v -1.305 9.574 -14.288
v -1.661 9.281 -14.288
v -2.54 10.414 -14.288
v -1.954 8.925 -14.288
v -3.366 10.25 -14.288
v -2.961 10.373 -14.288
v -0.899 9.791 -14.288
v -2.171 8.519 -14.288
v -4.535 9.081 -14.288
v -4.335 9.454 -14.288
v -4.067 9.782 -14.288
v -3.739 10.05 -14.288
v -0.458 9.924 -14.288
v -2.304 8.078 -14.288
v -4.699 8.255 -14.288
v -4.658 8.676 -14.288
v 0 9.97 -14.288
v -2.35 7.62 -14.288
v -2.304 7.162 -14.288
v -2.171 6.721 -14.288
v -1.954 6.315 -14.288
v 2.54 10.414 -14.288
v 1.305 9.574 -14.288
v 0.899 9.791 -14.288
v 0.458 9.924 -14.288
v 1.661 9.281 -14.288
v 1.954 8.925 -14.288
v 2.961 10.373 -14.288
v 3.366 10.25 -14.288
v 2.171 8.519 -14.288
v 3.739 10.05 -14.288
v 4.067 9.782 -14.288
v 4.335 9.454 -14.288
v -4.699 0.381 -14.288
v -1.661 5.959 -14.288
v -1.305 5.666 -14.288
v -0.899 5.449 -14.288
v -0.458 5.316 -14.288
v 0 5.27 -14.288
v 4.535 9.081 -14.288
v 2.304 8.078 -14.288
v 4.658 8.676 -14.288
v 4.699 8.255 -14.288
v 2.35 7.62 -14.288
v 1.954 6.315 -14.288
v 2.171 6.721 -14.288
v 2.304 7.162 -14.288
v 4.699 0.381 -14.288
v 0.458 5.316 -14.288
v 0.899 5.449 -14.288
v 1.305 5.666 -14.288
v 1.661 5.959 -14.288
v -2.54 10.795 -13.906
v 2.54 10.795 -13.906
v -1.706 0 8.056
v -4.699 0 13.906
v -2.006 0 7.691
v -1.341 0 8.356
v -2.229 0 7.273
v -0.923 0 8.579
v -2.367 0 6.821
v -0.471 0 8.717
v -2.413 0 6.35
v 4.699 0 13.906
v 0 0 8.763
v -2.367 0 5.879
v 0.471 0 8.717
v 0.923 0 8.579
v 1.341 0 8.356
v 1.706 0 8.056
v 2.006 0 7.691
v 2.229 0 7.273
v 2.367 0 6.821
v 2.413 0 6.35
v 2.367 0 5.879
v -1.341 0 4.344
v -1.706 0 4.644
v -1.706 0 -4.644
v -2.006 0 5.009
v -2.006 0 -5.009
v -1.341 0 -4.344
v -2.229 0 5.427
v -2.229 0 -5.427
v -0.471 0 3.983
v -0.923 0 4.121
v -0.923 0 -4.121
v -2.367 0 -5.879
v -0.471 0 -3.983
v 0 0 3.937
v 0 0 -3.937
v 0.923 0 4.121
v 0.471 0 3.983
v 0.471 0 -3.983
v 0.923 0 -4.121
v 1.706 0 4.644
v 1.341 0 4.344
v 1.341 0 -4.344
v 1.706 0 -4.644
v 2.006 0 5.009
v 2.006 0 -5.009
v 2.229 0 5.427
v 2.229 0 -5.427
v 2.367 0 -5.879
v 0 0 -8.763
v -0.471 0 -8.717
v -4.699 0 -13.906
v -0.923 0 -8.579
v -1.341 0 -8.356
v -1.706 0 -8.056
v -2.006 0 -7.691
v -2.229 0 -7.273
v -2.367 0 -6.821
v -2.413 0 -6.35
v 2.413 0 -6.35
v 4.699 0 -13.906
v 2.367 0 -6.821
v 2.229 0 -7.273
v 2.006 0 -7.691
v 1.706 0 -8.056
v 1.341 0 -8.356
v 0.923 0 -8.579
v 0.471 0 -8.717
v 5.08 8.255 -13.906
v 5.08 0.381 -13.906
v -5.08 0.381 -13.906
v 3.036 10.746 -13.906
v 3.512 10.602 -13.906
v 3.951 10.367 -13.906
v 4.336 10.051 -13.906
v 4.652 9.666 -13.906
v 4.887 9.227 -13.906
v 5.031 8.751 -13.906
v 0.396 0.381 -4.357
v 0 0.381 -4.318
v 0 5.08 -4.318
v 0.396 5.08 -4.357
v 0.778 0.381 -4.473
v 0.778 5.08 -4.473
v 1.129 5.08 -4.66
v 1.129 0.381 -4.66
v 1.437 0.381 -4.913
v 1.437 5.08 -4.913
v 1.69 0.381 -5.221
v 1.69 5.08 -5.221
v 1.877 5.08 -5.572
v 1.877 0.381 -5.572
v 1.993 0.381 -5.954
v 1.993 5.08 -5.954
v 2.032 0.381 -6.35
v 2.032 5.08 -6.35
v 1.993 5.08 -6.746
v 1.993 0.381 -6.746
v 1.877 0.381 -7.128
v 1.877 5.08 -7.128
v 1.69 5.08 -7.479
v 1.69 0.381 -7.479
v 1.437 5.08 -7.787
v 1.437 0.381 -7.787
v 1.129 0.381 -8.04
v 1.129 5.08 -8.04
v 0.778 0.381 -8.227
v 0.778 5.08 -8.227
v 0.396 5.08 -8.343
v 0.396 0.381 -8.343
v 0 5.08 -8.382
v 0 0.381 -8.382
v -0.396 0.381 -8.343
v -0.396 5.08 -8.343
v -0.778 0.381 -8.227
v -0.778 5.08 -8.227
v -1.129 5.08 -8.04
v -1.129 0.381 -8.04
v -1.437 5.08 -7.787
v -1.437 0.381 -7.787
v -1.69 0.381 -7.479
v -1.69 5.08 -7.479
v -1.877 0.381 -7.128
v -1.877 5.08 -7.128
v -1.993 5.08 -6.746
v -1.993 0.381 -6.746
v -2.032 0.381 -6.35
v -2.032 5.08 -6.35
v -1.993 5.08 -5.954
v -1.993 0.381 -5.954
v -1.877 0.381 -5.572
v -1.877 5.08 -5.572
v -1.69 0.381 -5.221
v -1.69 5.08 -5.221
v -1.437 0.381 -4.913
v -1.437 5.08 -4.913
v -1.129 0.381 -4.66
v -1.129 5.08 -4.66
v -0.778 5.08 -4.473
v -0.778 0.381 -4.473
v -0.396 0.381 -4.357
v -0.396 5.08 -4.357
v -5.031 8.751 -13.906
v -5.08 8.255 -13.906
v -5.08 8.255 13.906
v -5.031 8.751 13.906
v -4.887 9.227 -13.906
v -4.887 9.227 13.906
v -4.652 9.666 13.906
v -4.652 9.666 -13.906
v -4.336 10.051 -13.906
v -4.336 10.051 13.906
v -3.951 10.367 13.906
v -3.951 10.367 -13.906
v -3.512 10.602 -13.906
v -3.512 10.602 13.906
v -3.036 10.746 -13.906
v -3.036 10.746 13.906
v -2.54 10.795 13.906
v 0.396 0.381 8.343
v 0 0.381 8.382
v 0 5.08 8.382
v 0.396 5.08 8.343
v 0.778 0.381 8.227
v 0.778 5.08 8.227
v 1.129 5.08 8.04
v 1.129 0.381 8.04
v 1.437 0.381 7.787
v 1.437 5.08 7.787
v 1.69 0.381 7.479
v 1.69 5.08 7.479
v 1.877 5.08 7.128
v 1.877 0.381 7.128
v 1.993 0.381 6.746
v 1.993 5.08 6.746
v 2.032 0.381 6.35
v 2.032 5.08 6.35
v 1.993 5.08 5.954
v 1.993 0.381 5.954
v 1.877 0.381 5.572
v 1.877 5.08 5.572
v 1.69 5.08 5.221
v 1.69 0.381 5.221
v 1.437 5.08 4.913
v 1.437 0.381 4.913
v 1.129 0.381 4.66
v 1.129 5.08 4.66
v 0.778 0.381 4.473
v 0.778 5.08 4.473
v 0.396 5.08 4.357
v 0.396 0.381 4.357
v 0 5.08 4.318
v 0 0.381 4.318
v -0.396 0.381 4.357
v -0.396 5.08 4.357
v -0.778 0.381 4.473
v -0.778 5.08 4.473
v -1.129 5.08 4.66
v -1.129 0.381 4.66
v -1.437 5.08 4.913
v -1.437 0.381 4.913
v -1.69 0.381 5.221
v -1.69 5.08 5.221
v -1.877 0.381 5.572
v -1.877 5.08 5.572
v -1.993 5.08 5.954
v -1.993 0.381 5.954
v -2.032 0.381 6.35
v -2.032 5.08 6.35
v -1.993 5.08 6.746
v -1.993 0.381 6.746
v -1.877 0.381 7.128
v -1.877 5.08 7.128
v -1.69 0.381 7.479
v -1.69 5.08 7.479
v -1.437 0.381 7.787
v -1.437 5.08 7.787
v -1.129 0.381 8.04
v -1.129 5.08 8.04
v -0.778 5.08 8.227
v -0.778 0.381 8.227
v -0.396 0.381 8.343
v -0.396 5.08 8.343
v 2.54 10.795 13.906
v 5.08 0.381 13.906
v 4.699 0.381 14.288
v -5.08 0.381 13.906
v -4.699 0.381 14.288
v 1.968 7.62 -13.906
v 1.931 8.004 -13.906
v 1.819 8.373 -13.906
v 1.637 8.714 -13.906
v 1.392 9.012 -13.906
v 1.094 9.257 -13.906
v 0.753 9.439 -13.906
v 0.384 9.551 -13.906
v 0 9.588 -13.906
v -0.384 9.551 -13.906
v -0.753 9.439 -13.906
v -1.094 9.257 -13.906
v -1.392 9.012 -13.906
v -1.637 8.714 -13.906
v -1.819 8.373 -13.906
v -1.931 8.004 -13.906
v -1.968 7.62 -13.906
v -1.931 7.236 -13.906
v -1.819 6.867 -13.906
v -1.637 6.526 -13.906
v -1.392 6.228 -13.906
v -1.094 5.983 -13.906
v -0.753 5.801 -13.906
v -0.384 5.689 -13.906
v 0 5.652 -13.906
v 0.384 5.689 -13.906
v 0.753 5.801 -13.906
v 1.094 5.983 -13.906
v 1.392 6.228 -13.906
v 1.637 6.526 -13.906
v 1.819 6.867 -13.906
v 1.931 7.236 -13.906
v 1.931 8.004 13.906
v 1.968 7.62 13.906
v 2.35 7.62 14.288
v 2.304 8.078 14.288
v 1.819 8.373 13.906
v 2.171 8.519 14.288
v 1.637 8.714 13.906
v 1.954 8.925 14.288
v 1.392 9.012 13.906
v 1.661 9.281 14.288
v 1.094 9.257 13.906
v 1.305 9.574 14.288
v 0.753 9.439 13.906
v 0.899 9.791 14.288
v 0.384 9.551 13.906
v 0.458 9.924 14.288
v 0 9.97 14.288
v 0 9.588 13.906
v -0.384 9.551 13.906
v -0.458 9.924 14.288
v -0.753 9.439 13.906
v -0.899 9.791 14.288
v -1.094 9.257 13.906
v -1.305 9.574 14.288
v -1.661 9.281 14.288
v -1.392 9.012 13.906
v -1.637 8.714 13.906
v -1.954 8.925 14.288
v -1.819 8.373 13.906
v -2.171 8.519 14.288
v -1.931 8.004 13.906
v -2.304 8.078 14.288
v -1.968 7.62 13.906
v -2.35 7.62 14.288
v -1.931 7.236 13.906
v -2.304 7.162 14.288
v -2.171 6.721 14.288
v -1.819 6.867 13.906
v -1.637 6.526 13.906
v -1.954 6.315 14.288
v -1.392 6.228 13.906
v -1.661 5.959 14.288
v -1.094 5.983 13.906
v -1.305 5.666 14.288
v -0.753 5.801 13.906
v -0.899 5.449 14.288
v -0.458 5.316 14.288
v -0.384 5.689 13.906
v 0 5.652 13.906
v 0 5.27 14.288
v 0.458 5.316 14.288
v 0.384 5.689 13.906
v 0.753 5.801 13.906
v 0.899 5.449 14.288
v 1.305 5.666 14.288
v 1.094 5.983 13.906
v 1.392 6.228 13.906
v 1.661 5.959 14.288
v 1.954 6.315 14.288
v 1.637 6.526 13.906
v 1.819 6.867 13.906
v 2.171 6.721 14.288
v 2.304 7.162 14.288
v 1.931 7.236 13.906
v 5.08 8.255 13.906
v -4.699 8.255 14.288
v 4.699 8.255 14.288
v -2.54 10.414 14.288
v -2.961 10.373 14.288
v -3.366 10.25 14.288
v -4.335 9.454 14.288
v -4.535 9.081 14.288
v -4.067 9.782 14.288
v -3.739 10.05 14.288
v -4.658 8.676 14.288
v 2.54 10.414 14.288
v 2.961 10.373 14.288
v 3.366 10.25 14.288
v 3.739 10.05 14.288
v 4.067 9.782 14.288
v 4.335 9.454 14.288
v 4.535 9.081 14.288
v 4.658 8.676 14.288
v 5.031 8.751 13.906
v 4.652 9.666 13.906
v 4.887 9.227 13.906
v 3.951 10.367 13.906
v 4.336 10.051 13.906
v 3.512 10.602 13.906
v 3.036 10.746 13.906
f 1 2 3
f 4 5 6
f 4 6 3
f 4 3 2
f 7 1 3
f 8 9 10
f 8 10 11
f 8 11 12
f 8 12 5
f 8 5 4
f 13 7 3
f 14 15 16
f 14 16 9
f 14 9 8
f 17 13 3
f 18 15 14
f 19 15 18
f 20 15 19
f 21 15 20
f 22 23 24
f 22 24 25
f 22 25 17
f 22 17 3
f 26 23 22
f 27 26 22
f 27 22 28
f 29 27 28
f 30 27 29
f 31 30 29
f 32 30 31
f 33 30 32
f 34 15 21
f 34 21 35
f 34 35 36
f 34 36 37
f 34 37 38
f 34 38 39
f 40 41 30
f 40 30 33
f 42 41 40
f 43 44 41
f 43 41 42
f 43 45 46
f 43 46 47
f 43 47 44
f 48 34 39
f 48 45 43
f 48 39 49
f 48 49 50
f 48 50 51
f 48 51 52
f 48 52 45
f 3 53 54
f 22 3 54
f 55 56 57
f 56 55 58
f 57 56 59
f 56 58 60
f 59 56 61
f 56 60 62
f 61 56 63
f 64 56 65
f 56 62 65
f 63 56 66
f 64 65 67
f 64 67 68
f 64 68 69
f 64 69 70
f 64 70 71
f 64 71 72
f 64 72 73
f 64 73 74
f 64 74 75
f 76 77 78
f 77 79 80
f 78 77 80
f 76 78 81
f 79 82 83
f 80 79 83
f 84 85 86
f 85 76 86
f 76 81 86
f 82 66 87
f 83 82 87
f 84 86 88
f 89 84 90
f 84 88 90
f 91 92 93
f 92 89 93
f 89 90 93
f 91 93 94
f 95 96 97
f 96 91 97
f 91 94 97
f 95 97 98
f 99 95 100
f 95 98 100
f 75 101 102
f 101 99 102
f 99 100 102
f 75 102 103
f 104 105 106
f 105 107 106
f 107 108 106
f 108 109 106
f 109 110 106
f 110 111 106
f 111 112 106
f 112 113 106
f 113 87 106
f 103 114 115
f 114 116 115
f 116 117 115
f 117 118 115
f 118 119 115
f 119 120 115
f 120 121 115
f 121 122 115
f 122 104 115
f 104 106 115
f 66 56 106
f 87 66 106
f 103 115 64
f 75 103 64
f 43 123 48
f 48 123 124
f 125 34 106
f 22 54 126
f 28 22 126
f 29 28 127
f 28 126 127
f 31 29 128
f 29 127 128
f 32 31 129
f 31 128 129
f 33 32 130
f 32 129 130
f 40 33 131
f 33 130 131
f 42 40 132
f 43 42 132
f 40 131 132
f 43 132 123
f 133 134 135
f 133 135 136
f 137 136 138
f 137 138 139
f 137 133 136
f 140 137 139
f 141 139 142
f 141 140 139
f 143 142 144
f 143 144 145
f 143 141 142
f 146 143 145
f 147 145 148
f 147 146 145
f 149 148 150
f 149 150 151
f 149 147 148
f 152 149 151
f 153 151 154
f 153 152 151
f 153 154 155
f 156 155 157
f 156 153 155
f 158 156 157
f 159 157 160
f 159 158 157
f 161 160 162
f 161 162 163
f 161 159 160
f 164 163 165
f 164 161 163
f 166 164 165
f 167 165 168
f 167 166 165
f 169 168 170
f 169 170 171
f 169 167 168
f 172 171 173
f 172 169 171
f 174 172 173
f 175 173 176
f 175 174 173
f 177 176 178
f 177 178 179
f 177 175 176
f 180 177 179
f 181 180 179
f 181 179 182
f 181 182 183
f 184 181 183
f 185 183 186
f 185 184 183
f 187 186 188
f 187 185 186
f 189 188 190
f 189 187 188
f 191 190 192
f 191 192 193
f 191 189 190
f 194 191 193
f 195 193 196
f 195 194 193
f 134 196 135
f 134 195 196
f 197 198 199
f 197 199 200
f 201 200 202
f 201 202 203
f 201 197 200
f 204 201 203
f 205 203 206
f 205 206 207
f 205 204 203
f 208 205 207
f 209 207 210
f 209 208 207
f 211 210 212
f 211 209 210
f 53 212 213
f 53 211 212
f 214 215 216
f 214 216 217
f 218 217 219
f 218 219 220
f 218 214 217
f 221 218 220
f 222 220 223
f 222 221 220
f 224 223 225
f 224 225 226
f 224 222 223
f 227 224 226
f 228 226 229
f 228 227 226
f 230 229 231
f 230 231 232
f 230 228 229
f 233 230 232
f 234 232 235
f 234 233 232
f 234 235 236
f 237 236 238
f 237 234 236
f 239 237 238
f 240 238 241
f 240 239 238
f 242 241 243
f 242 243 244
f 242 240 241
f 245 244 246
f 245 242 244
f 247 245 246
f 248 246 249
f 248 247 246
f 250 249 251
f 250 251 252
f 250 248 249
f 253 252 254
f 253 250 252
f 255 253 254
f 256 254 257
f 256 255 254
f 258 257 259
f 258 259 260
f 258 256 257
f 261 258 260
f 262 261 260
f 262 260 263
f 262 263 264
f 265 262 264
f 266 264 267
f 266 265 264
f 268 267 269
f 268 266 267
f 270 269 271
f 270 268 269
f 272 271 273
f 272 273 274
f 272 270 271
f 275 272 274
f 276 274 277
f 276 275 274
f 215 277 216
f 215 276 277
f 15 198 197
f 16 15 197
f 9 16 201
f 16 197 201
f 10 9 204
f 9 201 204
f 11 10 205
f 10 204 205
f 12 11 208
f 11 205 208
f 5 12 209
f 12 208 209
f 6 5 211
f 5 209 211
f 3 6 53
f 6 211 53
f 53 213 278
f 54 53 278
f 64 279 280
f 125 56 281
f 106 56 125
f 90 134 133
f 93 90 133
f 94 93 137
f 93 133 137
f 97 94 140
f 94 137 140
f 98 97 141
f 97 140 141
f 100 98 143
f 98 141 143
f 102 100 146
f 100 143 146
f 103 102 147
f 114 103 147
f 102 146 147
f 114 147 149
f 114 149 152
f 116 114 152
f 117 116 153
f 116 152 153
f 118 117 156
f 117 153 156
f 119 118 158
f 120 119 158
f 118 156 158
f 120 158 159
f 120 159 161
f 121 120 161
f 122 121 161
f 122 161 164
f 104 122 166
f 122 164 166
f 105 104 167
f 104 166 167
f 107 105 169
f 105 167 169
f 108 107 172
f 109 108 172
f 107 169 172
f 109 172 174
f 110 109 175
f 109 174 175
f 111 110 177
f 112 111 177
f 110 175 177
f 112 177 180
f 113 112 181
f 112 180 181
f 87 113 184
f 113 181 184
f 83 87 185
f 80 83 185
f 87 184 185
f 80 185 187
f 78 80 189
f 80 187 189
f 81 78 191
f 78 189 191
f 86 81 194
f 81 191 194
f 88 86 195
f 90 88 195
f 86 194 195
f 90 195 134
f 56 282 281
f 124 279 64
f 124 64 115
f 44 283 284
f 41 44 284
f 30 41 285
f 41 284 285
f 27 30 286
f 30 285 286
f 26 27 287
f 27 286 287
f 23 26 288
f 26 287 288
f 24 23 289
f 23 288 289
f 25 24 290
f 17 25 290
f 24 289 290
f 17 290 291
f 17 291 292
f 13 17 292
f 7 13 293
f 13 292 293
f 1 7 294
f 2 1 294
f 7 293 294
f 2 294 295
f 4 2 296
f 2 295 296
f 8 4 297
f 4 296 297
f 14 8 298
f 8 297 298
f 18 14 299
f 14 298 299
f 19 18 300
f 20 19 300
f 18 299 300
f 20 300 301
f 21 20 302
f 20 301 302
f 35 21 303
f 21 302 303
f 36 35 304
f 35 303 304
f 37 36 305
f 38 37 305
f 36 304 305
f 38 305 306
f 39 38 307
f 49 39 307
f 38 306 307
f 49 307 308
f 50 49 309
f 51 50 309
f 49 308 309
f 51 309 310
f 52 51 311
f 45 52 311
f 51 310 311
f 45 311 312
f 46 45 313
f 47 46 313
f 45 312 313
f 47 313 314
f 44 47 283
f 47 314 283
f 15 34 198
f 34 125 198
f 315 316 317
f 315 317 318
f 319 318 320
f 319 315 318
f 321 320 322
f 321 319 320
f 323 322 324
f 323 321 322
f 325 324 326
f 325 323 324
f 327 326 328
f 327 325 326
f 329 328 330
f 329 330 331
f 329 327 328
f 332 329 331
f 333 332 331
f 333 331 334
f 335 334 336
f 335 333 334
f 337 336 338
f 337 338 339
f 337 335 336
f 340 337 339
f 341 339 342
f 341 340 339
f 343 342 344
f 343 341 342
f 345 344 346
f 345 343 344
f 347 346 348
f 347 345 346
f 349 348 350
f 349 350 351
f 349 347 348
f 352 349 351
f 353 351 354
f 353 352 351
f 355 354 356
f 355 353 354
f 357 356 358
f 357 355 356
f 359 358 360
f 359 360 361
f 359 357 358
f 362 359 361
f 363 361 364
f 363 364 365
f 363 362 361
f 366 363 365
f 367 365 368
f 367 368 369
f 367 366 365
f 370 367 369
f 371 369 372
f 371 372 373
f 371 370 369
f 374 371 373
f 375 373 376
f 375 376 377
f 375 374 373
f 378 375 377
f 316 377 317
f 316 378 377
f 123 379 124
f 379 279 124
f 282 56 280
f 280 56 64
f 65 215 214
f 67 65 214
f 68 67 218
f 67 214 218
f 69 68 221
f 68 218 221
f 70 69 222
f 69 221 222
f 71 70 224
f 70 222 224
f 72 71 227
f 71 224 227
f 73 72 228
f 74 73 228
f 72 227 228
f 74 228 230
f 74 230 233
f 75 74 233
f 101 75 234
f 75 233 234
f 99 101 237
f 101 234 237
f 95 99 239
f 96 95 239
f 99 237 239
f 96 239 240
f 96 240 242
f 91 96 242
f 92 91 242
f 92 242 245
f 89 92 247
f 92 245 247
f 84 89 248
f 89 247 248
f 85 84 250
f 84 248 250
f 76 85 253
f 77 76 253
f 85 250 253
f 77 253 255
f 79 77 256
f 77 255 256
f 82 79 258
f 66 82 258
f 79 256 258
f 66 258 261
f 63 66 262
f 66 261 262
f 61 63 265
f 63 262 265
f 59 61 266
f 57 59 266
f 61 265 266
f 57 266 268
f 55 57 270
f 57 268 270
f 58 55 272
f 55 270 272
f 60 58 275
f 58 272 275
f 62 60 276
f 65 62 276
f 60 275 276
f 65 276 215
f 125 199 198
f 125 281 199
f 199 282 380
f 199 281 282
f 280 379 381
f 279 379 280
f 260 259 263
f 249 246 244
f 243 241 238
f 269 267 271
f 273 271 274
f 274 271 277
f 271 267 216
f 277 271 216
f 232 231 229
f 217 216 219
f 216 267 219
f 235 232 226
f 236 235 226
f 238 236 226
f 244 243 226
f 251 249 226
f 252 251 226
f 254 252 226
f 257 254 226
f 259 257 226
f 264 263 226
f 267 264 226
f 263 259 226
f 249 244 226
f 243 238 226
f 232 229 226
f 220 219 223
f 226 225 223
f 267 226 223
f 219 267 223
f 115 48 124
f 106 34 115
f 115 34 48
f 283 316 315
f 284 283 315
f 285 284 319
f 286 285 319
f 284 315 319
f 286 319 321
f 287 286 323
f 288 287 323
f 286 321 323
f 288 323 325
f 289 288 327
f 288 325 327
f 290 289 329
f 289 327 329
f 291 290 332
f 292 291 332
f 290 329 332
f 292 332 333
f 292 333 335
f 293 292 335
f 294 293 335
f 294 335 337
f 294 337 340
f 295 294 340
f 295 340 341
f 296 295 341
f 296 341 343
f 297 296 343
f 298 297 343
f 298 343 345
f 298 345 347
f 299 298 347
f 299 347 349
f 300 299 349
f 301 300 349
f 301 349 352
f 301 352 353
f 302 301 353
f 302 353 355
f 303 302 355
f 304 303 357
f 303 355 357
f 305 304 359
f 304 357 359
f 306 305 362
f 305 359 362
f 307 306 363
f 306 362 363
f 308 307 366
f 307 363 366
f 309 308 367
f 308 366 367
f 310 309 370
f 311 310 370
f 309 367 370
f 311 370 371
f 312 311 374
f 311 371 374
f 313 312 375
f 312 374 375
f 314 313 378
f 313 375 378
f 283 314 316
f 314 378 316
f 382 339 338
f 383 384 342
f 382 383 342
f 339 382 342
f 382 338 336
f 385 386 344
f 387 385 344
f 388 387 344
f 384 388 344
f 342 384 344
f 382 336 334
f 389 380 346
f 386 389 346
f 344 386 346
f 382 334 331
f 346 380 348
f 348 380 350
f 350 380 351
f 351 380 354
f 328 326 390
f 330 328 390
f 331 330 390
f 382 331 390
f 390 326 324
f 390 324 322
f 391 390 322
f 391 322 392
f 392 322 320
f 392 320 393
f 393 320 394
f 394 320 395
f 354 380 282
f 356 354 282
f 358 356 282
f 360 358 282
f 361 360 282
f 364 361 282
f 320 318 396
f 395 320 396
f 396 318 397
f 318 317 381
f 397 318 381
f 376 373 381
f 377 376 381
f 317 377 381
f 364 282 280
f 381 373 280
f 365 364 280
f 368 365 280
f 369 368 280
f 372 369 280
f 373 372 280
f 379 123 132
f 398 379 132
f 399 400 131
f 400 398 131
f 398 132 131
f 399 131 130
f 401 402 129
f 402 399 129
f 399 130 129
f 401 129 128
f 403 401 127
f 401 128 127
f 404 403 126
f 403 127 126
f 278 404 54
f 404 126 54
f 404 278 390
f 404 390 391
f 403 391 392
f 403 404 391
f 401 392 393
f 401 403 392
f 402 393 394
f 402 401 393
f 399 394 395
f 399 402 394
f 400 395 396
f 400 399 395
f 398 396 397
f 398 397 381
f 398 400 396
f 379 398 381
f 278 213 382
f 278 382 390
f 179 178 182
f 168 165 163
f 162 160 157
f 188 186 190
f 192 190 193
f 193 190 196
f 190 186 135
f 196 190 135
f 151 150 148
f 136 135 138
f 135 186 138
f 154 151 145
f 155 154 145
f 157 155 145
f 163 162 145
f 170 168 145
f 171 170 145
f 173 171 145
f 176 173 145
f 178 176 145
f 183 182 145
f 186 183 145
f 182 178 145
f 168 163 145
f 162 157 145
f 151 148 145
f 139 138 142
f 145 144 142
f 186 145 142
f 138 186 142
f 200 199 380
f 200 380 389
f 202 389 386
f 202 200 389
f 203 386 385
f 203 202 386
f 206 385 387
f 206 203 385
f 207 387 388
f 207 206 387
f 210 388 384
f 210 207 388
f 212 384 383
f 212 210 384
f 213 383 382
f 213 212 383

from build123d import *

# Parameters (mm, degrees)
SKETCH1_W           = 10.16
SKETCH1_H           = 28.575
BOSS_EXTRUDE1_DEPTH = 10.795
SKETCH1_6_R         = 2.032
CUT_EXTRUDE3_DEPTH  = 5.08
SKETCH3_R           = 1.9685
CUT_EXTRUDE4_DEPTH  = 31.965610764
FILLET1_R           = 2.54
CHAMFER2_SIZE       = 0.381


with BuildPart() as part:
    # Sketch1 → Boss-Extrude1 (new body)
    with BuildSketch(Plane(origin=(0, 0, 0), x_dir=(1, 0, 0), z_dir=(0, 1, 0))):
        Rectangle(SKETCH1_W, SKETCH1_H)
    extrude(amount=BOSS_EXTRUDE1_DEPTH)

    # Sketch1<6> → Cut-Extrude3 (cut)
    with BuildSketch(Plane(origin=(0, 0, 0), x_dir=(1, 0, 0), z_dir=(0, 1, 0))):
        with Locations((0, 6.35)):
            Circle(SKETCH1_6_R)
        with Locations((0, -6.35)):
            Circle(SKETCH1_6_R)
    extrude(amount=CUT_EXTRUDE3_DEPTH, mode=Mode.SUBTRACT)

    # Sketch3 → Cut-Extrude4 (cut, through all)
    with BuildSketch(Plane.XY.offset(14.2875)):
        with Locations((0, 7.62)):
            Circle(SKETCH3_R)
    extrude(amount=-CUT_EXTRUDE4_DEPTH, mode=Mode.SUBTRACT)

    # Fillet1
    fillet1_edges = [part.edges().sort_by_distance(p)[0] for p in [
        (5.08, 10.795, 0),
        (-5.08, 10.795, 0),
    ]]
    fillet(fillet1_edges, radius=FILLET1_R)

    # Chamfer2
    chamfer2_edges = [part.edges().sort_by_distance(p)[0] for p in [
        (-5.08, 4.1275, -14.2875),
        (5.08, 4.1275, -14.2875),
        (-5.08, 4.1275, 14.2875),
        (5.08, 4.1275, 14.2875),
        (-4.336051224, 10.051051224, -14.2875),
        (0, 10.795, -14.2875),
        (4.336051224, 10.051051224, -14.2875),
        (-4.336051224, 10.051051224, 14.2875),
        (0, 10.795, 14.2875),
        (4.336051224, 10.051051224, 14.2875),
        (-2.032, 0, -6.35),
        (-2.032, 0, 6.35),
        (-1.9685, 7.62, 14.2875),
        (-1.9685, 7.62, -14.2875),
        (0, 0, 14.2875),
        (-5.08, 0, 0),
        (0, 0, -14.2875),
        (5.08, 0, 0),
    ]]
    chamfer(chamfer2_edges, length=CHAMFER2_SIZE)


solid = part.part
